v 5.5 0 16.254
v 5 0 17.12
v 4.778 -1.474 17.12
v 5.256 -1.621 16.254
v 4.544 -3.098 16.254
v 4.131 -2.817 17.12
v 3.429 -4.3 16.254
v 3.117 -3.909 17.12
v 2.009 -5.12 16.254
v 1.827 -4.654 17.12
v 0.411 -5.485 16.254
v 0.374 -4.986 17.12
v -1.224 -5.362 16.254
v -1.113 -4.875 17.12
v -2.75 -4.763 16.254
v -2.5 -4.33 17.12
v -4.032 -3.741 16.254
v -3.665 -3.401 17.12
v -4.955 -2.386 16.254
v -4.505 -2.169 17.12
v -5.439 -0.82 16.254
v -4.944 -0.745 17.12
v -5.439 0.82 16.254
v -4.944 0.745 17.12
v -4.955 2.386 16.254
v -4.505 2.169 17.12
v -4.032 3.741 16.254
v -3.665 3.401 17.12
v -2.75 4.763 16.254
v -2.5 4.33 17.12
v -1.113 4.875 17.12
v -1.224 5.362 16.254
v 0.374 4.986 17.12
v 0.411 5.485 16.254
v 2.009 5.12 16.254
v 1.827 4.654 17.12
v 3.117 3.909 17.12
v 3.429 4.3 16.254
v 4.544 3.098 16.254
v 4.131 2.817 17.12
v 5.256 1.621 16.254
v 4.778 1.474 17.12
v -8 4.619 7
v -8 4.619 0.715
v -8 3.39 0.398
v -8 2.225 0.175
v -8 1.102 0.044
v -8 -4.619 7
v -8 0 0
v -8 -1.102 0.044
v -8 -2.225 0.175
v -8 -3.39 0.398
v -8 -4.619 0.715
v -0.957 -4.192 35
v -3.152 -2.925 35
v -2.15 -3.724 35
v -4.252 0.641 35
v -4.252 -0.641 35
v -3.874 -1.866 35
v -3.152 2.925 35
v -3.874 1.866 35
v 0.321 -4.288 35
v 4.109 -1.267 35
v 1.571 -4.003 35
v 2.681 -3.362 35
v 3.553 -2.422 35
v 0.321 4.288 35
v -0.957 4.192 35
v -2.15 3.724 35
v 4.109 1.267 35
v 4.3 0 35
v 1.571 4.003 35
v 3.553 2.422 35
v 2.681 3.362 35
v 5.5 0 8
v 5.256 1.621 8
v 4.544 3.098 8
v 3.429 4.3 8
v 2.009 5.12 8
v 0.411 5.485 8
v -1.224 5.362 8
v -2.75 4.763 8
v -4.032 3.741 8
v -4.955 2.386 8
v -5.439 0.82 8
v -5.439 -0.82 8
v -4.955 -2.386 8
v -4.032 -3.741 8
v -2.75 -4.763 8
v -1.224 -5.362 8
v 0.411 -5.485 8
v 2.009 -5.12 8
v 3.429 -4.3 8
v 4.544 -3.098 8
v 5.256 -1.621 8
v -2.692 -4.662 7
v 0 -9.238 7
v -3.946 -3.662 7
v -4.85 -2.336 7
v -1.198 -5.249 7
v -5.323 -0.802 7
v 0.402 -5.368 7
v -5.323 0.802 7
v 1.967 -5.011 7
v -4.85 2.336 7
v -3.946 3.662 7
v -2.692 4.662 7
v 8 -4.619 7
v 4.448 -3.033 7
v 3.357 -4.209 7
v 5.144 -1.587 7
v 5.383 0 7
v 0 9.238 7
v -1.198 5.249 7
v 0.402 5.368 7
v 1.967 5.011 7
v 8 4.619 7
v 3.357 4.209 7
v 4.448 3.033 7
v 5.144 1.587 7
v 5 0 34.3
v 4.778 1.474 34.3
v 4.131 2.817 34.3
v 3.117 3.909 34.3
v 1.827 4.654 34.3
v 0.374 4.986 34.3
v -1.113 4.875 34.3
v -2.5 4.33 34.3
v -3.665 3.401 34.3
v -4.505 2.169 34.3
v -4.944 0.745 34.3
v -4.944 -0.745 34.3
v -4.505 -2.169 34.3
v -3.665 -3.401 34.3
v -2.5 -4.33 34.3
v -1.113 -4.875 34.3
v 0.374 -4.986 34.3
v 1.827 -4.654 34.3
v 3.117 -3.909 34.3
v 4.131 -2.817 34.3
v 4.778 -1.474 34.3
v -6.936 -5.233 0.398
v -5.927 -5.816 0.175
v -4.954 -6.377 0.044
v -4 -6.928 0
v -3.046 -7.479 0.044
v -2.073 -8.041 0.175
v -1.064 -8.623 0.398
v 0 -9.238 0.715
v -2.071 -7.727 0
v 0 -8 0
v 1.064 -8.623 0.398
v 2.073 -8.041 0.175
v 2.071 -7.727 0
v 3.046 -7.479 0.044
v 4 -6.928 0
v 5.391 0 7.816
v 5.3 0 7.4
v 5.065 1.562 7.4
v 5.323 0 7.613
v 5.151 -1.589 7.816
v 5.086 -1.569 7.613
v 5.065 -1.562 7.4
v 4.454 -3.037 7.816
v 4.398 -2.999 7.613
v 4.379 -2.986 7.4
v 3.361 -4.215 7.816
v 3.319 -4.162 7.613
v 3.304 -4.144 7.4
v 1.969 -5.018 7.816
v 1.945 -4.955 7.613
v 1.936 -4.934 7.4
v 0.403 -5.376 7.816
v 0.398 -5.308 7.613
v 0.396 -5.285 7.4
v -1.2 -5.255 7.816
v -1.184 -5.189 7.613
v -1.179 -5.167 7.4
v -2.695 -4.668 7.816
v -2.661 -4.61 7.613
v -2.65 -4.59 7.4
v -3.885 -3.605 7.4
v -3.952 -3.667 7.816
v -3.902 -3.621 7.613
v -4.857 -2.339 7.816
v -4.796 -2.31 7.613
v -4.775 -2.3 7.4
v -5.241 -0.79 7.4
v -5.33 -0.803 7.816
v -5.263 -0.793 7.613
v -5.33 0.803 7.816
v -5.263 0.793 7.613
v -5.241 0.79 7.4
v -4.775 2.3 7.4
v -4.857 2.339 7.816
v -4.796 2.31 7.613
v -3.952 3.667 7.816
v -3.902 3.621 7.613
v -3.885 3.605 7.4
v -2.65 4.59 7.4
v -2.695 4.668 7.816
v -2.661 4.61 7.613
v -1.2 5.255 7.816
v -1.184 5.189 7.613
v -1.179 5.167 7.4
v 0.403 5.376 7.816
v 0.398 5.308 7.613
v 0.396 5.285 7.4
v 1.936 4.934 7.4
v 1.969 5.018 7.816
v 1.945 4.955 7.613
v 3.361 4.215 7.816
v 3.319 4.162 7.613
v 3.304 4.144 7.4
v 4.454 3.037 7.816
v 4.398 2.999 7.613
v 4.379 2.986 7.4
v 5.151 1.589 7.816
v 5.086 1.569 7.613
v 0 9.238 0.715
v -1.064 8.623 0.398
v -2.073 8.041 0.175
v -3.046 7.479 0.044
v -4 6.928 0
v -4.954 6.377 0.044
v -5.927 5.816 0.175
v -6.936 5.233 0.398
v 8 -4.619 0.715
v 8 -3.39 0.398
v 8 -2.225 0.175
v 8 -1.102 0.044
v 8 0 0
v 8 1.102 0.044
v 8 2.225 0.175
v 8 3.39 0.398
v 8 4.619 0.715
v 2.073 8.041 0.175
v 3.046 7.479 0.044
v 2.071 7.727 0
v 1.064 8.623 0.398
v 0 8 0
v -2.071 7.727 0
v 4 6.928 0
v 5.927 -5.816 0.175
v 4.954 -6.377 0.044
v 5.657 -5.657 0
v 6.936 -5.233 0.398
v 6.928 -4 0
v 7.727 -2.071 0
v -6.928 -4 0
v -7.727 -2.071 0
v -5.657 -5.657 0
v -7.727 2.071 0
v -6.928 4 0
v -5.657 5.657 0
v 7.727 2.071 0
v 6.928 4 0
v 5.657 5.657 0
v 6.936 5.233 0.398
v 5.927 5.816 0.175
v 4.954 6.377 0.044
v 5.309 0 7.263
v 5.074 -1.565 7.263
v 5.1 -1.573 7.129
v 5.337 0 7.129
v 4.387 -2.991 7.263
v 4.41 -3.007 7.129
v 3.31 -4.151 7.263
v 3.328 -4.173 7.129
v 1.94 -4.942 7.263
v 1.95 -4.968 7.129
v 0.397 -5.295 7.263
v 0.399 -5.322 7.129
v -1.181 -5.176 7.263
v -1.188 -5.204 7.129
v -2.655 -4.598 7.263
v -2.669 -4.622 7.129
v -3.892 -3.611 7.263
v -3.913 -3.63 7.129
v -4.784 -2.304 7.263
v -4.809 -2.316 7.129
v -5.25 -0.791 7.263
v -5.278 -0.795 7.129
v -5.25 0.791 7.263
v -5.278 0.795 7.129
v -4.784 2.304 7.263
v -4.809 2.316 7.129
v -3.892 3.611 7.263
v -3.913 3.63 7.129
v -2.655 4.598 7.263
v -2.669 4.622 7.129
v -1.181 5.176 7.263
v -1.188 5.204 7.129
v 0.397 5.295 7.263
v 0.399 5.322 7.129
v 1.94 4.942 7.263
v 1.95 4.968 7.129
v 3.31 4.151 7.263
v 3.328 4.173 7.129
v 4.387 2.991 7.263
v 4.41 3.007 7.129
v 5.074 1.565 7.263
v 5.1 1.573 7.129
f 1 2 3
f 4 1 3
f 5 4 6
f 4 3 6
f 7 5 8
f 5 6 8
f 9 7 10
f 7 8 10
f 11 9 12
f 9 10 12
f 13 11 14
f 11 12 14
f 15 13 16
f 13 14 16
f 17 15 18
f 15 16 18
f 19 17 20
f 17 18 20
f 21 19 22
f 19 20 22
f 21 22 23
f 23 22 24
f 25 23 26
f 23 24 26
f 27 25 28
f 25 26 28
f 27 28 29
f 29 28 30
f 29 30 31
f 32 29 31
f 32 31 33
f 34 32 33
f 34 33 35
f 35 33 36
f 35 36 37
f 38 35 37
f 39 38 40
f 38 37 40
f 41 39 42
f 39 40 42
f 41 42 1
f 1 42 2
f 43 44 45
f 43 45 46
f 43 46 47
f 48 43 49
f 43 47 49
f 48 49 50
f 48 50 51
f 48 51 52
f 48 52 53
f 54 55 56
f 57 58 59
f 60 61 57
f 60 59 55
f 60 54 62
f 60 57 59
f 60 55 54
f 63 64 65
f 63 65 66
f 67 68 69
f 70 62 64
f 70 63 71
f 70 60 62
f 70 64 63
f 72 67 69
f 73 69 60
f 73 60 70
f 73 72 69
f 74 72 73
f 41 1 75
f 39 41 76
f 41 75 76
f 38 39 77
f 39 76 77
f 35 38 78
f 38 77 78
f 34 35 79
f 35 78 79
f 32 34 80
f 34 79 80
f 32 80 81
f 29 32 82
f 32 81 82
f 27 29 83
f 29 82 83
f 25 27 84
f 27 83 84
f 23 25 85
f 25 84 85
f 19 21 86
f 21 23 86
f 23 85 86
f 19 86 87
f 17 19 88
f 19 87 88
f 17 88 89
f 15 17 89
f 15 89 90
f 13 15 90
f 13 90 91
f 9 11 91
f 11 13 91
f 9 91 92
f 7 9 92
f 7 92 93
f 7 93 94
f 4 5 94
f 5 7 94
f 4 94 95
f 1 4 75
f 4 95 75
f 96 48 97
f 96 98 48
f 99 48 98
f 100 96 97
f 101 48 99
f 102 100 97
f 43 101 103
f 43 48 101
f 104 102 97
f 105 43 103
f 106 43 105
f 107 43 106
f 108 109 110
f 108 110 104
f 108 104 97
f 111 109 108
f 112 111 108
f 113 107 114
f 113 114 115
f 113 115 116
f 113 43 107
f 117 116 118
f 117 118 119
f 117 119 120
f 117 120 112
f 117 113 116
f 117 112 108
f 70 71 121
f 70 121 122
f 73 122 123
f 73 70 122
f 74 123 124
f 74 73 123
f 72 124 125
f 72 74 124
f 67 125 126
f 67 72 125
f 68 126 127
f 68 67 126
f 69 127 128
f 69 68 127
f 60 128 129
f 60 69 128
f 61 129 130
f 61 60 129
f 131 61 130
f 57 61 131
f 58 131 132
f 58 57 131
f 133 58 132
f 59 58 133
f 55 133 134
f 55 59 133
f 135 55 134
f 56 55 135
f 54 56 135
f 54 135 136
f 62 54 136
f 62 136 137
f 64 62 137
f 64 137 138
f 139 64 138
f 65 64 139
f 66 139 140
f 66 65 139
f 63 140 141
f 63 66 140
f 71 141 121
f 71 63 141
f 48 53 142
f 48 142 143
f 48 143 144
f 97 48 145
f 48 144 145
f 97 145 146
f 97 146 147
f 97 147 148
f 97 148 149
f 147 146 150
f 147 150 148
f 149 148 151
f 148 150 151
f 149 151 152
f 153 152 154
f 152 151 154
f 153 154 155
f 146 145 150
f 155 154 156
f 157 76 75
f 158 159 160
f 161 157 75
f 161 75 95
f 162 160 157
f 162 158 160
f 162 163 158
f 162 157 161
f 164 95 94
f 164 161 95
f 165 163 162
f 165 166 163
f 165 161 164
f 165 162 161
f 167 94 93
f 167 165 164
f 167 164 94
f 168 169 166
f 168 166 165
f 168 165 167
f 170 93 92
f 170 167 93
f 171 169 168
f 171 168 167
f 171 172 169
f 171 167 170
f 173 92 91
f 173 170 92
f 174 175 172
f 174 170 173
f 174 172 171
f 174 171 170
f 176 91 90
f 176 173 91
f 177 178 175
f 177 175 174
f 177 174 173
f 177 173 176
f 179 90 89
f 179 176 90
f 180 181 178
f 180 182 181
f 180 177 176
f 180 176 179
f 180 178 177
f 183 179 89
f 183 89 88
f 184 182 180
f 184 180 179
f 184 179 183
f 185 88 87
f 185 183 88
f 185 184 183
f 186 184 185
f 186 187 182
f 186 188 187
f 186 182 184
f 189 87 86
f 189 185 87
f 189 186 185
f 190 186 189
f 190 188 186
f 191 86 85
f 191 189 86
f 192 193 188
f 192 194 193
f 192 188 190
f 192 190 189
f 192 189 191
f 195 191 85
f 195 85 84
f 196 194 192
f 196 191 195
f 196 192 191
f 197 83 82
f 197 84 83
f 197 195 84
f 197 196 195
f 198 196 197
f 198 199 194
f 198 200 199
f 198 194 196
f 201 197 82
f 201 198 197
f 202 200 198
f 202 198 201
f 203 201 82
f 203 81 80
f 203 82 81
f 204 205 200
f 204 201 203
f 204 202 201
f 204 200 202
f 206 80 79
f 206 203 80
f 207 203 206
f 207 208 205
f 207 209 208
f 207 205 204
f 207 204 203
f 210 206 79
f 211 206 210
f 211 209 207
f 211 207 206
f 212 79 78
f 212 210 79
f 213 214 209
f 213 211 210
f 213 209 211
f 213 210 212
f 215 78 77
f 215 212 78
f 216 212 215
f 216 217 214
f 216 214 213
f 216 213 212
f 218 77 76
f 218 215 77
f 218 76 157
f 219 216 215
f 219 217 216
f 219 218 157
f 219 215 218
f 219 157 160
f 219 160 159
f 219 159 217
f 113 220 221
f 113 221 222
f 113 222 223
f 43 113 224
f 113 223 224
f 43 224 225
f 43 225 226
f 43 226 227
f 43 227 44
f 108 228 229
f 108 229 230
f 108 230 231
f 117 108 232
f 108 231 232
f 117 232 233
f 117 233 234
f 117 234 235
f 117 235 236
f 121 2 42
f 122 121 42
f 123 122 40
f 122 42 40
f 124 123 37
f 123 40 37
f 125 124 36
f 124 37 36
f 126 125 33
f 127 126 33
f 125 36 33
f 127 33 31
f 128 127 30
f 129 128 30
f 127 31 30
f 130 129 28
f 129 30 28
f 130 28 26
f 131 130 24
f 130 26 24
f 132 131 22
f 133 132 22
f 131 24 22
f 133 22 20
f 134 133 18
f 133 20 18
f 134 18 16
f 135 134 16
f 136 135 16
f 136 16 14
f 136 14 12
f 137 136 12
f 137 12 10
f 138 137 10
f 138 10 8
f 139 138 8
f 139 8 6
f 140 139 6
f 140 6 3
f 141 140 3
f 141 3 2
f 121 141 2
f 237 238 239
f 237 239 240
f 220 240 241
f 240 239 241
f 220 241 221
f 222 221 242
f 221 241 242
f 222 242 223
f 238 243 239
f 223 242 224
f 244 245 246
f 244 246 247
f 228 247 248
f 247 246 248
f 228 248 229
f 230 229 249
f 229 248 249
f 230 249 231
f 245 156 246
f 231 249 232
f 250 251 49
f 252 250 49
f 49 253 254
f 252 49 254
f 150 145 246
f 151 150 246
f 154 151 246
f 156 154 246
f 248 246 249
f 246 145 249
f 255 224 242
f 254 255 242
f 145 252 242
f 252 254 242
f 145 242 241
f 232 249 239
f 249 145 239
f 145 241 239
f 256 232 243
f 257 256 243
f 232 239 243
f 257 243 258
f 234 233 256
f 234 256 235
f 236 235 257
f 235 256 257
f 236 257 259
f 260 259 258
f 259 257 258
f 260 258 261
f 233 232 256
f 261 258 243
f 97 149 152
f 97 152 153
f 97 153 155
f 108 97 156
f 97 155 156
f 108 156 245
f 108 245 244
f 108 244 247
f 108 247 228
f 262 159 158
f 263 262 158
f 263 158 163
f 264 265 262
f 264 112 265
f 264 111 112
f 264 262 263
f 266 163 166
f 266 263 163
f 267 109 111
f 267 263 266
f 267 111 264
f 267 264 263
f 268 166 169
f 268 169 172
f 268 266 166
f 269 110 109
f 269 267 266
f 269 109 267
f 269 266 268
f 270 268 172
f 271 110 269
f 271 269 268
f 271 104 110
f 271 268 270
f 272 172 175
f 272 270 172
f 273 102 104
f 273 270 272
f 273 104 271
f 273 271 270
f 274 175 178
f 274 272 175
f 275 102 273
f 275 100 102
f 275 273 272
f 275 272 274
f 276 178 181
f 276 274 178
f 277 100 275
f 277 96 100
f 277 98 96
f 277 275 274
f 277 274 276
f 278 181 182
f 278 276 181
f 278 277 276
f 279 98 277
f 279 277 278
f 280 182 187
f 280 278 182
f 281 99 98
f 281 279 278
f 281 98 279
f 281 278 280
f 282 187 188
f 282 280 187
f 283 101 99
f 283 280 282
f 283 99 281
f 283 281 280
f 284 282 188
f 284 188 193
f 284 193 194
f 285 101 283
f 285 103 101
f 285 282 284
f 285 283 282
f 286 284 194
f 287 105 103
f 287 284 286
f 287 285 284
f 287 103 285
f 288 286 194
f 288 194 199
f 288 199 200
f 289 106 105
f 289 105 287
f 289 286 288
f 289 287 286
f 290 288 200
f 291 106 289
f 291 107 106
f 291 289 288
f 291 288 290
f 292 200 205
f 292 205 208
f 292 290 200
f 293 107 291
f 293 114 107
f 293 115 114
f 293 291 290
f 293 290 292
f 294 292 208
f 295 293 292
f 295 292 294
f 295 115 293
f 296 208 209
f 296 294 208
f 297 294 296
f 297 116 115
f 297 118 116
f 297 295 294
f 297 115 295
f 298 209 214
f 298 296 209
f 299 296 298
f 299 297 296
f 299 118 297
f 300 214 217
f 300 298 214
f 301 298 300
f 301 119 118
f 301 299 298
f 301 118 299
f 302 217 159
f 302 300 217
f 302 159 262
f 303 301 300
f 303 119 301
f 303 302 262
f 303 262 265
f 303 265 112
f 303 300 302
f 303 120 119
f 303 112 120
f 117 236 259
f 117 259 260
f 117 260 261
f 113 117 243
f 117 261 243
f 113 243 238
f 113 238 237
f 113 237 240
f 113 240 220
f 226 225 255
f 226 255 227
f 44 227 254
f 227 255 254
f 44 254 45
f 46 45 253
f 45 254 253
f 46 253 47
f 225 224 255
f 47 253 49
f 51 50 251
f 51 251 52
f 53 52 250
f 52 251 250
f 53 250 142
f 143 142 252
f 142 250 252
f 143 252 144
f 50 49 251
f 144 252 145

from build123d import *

# Parameters (mm, degrees)
VYSUNOUT1_DEPTH = 7
SKICA5_R        = 5
VYSUNOUT4_DEPTH = 28
ZKOSIT1_SIZE    = 0.7
SKICA3_R        = 5.3
VYSUNOUT2_DEPTH = 1
SKICA4_R        = 5.5
VYSUNOUT3_DEPTH = 9.12


with BuildPart() as part:
    # Skica1 → Vysunout1 (new body)
    with BuildSketch(Plane.XY):
        Polygon((8, -4.618802154), (8, 4.618802154), (0, 9.237604307), (-8, 4.618802154), (-8, -4.618802154), (0, -9.237604307), align=None)
    extrude(amount=VYSUNOUT1_DEPTH)

    # Skica2 → Odebrat otočením1 (revolve, cut)
    with BuildSketch(Plane(origin=(0, 0, 0), x_dir=(1, 0, 0), z_dir=(0, 1, 0))):
        Polygon((8, 0), (20.124355653, 0), (20.124355653, -7), align=None)
    revolve(axis=Axis((0, 0, 0), (0, 0, 1)), mode=Mode.SUBTRACT)

    # Skica5 → Vysunout4 (add)
    with BuildSketch(Plane.XY.offset(7)):
        Circle(SKICA5_R)
    extrude(amount=VYSUNOUT4_DEPTH)

    # Zkosit1
    zkosit1_edges = [part.edges().sort_by_distance(p)[0] for p in [
        (-5, 0, 35),
    ]]
    chamfer(zkosit1_edges, length=ZKOSIT1_SIZE)

    # Skica3 → Vysunout2 (add)
    with BuildSketch(Plane.XY.offset(7)):
        Circle(SKICA3_R)
    extrude(amount=VYSUNOUT2_DEPTH)

    # Skica4 → Vysunout3 (add)
    with BuildSketch(Plane.XY.offset(8)):
        Circle(SKICA4_R)
    extrude(amount=VYSUNOUT3_DEPTH)

    # Skica6 → Odebrat otočením2 (revolve, cut)
    with BuildSketch(Plane(origin=(0, 0, 0), x_dir=(1, 0, 0), z_dir=(0, 1, 0)), mode=Mode.PRIVATE) as odebrat_oto_en_m2_sk:
        Polygon((-5.5, -17.12), (-5.5, -16.253974596), (-5, -17.12), align=None)
    revolve(odebrat_oto_en_m2_sk.sketch.rotate(Axis((0, 0, 17.12), (0, 0, -1)), 180), axis=Axis((0, 0, 17.12), (0, 0, -1)), mode=Mode.SUBTRACT)

    # Skica7 → Otočit kolem osy1 (revolve)
    with BuildSketch(Plane(origin=(0, 0, 0), x_dir=(1, 0, 0), z_dir=(0, 1, 0))):
        with BuildLine():
            ThreePointArc((5.3, -7.4), (5.321093687, -7.195690356), (5.383484861, -7))
            Line((5.383484861, -7), (5.3, -7))
            Line((5.3, -7), (5.3, -7.4))
        make_face()
        with BuildLine():
            ThreePointArc((5.5, -8), (5.351316702, -7.716227766), (5.3, -7.4))
            Line((5.3, -7.4), (5.3, -8))
            Line((5.3, -8), (5.5, -8))
        make_face()
    revolve(axis=Axis((0, 0, 16.253974596), (0, 0, -1)))


solid = part.part
